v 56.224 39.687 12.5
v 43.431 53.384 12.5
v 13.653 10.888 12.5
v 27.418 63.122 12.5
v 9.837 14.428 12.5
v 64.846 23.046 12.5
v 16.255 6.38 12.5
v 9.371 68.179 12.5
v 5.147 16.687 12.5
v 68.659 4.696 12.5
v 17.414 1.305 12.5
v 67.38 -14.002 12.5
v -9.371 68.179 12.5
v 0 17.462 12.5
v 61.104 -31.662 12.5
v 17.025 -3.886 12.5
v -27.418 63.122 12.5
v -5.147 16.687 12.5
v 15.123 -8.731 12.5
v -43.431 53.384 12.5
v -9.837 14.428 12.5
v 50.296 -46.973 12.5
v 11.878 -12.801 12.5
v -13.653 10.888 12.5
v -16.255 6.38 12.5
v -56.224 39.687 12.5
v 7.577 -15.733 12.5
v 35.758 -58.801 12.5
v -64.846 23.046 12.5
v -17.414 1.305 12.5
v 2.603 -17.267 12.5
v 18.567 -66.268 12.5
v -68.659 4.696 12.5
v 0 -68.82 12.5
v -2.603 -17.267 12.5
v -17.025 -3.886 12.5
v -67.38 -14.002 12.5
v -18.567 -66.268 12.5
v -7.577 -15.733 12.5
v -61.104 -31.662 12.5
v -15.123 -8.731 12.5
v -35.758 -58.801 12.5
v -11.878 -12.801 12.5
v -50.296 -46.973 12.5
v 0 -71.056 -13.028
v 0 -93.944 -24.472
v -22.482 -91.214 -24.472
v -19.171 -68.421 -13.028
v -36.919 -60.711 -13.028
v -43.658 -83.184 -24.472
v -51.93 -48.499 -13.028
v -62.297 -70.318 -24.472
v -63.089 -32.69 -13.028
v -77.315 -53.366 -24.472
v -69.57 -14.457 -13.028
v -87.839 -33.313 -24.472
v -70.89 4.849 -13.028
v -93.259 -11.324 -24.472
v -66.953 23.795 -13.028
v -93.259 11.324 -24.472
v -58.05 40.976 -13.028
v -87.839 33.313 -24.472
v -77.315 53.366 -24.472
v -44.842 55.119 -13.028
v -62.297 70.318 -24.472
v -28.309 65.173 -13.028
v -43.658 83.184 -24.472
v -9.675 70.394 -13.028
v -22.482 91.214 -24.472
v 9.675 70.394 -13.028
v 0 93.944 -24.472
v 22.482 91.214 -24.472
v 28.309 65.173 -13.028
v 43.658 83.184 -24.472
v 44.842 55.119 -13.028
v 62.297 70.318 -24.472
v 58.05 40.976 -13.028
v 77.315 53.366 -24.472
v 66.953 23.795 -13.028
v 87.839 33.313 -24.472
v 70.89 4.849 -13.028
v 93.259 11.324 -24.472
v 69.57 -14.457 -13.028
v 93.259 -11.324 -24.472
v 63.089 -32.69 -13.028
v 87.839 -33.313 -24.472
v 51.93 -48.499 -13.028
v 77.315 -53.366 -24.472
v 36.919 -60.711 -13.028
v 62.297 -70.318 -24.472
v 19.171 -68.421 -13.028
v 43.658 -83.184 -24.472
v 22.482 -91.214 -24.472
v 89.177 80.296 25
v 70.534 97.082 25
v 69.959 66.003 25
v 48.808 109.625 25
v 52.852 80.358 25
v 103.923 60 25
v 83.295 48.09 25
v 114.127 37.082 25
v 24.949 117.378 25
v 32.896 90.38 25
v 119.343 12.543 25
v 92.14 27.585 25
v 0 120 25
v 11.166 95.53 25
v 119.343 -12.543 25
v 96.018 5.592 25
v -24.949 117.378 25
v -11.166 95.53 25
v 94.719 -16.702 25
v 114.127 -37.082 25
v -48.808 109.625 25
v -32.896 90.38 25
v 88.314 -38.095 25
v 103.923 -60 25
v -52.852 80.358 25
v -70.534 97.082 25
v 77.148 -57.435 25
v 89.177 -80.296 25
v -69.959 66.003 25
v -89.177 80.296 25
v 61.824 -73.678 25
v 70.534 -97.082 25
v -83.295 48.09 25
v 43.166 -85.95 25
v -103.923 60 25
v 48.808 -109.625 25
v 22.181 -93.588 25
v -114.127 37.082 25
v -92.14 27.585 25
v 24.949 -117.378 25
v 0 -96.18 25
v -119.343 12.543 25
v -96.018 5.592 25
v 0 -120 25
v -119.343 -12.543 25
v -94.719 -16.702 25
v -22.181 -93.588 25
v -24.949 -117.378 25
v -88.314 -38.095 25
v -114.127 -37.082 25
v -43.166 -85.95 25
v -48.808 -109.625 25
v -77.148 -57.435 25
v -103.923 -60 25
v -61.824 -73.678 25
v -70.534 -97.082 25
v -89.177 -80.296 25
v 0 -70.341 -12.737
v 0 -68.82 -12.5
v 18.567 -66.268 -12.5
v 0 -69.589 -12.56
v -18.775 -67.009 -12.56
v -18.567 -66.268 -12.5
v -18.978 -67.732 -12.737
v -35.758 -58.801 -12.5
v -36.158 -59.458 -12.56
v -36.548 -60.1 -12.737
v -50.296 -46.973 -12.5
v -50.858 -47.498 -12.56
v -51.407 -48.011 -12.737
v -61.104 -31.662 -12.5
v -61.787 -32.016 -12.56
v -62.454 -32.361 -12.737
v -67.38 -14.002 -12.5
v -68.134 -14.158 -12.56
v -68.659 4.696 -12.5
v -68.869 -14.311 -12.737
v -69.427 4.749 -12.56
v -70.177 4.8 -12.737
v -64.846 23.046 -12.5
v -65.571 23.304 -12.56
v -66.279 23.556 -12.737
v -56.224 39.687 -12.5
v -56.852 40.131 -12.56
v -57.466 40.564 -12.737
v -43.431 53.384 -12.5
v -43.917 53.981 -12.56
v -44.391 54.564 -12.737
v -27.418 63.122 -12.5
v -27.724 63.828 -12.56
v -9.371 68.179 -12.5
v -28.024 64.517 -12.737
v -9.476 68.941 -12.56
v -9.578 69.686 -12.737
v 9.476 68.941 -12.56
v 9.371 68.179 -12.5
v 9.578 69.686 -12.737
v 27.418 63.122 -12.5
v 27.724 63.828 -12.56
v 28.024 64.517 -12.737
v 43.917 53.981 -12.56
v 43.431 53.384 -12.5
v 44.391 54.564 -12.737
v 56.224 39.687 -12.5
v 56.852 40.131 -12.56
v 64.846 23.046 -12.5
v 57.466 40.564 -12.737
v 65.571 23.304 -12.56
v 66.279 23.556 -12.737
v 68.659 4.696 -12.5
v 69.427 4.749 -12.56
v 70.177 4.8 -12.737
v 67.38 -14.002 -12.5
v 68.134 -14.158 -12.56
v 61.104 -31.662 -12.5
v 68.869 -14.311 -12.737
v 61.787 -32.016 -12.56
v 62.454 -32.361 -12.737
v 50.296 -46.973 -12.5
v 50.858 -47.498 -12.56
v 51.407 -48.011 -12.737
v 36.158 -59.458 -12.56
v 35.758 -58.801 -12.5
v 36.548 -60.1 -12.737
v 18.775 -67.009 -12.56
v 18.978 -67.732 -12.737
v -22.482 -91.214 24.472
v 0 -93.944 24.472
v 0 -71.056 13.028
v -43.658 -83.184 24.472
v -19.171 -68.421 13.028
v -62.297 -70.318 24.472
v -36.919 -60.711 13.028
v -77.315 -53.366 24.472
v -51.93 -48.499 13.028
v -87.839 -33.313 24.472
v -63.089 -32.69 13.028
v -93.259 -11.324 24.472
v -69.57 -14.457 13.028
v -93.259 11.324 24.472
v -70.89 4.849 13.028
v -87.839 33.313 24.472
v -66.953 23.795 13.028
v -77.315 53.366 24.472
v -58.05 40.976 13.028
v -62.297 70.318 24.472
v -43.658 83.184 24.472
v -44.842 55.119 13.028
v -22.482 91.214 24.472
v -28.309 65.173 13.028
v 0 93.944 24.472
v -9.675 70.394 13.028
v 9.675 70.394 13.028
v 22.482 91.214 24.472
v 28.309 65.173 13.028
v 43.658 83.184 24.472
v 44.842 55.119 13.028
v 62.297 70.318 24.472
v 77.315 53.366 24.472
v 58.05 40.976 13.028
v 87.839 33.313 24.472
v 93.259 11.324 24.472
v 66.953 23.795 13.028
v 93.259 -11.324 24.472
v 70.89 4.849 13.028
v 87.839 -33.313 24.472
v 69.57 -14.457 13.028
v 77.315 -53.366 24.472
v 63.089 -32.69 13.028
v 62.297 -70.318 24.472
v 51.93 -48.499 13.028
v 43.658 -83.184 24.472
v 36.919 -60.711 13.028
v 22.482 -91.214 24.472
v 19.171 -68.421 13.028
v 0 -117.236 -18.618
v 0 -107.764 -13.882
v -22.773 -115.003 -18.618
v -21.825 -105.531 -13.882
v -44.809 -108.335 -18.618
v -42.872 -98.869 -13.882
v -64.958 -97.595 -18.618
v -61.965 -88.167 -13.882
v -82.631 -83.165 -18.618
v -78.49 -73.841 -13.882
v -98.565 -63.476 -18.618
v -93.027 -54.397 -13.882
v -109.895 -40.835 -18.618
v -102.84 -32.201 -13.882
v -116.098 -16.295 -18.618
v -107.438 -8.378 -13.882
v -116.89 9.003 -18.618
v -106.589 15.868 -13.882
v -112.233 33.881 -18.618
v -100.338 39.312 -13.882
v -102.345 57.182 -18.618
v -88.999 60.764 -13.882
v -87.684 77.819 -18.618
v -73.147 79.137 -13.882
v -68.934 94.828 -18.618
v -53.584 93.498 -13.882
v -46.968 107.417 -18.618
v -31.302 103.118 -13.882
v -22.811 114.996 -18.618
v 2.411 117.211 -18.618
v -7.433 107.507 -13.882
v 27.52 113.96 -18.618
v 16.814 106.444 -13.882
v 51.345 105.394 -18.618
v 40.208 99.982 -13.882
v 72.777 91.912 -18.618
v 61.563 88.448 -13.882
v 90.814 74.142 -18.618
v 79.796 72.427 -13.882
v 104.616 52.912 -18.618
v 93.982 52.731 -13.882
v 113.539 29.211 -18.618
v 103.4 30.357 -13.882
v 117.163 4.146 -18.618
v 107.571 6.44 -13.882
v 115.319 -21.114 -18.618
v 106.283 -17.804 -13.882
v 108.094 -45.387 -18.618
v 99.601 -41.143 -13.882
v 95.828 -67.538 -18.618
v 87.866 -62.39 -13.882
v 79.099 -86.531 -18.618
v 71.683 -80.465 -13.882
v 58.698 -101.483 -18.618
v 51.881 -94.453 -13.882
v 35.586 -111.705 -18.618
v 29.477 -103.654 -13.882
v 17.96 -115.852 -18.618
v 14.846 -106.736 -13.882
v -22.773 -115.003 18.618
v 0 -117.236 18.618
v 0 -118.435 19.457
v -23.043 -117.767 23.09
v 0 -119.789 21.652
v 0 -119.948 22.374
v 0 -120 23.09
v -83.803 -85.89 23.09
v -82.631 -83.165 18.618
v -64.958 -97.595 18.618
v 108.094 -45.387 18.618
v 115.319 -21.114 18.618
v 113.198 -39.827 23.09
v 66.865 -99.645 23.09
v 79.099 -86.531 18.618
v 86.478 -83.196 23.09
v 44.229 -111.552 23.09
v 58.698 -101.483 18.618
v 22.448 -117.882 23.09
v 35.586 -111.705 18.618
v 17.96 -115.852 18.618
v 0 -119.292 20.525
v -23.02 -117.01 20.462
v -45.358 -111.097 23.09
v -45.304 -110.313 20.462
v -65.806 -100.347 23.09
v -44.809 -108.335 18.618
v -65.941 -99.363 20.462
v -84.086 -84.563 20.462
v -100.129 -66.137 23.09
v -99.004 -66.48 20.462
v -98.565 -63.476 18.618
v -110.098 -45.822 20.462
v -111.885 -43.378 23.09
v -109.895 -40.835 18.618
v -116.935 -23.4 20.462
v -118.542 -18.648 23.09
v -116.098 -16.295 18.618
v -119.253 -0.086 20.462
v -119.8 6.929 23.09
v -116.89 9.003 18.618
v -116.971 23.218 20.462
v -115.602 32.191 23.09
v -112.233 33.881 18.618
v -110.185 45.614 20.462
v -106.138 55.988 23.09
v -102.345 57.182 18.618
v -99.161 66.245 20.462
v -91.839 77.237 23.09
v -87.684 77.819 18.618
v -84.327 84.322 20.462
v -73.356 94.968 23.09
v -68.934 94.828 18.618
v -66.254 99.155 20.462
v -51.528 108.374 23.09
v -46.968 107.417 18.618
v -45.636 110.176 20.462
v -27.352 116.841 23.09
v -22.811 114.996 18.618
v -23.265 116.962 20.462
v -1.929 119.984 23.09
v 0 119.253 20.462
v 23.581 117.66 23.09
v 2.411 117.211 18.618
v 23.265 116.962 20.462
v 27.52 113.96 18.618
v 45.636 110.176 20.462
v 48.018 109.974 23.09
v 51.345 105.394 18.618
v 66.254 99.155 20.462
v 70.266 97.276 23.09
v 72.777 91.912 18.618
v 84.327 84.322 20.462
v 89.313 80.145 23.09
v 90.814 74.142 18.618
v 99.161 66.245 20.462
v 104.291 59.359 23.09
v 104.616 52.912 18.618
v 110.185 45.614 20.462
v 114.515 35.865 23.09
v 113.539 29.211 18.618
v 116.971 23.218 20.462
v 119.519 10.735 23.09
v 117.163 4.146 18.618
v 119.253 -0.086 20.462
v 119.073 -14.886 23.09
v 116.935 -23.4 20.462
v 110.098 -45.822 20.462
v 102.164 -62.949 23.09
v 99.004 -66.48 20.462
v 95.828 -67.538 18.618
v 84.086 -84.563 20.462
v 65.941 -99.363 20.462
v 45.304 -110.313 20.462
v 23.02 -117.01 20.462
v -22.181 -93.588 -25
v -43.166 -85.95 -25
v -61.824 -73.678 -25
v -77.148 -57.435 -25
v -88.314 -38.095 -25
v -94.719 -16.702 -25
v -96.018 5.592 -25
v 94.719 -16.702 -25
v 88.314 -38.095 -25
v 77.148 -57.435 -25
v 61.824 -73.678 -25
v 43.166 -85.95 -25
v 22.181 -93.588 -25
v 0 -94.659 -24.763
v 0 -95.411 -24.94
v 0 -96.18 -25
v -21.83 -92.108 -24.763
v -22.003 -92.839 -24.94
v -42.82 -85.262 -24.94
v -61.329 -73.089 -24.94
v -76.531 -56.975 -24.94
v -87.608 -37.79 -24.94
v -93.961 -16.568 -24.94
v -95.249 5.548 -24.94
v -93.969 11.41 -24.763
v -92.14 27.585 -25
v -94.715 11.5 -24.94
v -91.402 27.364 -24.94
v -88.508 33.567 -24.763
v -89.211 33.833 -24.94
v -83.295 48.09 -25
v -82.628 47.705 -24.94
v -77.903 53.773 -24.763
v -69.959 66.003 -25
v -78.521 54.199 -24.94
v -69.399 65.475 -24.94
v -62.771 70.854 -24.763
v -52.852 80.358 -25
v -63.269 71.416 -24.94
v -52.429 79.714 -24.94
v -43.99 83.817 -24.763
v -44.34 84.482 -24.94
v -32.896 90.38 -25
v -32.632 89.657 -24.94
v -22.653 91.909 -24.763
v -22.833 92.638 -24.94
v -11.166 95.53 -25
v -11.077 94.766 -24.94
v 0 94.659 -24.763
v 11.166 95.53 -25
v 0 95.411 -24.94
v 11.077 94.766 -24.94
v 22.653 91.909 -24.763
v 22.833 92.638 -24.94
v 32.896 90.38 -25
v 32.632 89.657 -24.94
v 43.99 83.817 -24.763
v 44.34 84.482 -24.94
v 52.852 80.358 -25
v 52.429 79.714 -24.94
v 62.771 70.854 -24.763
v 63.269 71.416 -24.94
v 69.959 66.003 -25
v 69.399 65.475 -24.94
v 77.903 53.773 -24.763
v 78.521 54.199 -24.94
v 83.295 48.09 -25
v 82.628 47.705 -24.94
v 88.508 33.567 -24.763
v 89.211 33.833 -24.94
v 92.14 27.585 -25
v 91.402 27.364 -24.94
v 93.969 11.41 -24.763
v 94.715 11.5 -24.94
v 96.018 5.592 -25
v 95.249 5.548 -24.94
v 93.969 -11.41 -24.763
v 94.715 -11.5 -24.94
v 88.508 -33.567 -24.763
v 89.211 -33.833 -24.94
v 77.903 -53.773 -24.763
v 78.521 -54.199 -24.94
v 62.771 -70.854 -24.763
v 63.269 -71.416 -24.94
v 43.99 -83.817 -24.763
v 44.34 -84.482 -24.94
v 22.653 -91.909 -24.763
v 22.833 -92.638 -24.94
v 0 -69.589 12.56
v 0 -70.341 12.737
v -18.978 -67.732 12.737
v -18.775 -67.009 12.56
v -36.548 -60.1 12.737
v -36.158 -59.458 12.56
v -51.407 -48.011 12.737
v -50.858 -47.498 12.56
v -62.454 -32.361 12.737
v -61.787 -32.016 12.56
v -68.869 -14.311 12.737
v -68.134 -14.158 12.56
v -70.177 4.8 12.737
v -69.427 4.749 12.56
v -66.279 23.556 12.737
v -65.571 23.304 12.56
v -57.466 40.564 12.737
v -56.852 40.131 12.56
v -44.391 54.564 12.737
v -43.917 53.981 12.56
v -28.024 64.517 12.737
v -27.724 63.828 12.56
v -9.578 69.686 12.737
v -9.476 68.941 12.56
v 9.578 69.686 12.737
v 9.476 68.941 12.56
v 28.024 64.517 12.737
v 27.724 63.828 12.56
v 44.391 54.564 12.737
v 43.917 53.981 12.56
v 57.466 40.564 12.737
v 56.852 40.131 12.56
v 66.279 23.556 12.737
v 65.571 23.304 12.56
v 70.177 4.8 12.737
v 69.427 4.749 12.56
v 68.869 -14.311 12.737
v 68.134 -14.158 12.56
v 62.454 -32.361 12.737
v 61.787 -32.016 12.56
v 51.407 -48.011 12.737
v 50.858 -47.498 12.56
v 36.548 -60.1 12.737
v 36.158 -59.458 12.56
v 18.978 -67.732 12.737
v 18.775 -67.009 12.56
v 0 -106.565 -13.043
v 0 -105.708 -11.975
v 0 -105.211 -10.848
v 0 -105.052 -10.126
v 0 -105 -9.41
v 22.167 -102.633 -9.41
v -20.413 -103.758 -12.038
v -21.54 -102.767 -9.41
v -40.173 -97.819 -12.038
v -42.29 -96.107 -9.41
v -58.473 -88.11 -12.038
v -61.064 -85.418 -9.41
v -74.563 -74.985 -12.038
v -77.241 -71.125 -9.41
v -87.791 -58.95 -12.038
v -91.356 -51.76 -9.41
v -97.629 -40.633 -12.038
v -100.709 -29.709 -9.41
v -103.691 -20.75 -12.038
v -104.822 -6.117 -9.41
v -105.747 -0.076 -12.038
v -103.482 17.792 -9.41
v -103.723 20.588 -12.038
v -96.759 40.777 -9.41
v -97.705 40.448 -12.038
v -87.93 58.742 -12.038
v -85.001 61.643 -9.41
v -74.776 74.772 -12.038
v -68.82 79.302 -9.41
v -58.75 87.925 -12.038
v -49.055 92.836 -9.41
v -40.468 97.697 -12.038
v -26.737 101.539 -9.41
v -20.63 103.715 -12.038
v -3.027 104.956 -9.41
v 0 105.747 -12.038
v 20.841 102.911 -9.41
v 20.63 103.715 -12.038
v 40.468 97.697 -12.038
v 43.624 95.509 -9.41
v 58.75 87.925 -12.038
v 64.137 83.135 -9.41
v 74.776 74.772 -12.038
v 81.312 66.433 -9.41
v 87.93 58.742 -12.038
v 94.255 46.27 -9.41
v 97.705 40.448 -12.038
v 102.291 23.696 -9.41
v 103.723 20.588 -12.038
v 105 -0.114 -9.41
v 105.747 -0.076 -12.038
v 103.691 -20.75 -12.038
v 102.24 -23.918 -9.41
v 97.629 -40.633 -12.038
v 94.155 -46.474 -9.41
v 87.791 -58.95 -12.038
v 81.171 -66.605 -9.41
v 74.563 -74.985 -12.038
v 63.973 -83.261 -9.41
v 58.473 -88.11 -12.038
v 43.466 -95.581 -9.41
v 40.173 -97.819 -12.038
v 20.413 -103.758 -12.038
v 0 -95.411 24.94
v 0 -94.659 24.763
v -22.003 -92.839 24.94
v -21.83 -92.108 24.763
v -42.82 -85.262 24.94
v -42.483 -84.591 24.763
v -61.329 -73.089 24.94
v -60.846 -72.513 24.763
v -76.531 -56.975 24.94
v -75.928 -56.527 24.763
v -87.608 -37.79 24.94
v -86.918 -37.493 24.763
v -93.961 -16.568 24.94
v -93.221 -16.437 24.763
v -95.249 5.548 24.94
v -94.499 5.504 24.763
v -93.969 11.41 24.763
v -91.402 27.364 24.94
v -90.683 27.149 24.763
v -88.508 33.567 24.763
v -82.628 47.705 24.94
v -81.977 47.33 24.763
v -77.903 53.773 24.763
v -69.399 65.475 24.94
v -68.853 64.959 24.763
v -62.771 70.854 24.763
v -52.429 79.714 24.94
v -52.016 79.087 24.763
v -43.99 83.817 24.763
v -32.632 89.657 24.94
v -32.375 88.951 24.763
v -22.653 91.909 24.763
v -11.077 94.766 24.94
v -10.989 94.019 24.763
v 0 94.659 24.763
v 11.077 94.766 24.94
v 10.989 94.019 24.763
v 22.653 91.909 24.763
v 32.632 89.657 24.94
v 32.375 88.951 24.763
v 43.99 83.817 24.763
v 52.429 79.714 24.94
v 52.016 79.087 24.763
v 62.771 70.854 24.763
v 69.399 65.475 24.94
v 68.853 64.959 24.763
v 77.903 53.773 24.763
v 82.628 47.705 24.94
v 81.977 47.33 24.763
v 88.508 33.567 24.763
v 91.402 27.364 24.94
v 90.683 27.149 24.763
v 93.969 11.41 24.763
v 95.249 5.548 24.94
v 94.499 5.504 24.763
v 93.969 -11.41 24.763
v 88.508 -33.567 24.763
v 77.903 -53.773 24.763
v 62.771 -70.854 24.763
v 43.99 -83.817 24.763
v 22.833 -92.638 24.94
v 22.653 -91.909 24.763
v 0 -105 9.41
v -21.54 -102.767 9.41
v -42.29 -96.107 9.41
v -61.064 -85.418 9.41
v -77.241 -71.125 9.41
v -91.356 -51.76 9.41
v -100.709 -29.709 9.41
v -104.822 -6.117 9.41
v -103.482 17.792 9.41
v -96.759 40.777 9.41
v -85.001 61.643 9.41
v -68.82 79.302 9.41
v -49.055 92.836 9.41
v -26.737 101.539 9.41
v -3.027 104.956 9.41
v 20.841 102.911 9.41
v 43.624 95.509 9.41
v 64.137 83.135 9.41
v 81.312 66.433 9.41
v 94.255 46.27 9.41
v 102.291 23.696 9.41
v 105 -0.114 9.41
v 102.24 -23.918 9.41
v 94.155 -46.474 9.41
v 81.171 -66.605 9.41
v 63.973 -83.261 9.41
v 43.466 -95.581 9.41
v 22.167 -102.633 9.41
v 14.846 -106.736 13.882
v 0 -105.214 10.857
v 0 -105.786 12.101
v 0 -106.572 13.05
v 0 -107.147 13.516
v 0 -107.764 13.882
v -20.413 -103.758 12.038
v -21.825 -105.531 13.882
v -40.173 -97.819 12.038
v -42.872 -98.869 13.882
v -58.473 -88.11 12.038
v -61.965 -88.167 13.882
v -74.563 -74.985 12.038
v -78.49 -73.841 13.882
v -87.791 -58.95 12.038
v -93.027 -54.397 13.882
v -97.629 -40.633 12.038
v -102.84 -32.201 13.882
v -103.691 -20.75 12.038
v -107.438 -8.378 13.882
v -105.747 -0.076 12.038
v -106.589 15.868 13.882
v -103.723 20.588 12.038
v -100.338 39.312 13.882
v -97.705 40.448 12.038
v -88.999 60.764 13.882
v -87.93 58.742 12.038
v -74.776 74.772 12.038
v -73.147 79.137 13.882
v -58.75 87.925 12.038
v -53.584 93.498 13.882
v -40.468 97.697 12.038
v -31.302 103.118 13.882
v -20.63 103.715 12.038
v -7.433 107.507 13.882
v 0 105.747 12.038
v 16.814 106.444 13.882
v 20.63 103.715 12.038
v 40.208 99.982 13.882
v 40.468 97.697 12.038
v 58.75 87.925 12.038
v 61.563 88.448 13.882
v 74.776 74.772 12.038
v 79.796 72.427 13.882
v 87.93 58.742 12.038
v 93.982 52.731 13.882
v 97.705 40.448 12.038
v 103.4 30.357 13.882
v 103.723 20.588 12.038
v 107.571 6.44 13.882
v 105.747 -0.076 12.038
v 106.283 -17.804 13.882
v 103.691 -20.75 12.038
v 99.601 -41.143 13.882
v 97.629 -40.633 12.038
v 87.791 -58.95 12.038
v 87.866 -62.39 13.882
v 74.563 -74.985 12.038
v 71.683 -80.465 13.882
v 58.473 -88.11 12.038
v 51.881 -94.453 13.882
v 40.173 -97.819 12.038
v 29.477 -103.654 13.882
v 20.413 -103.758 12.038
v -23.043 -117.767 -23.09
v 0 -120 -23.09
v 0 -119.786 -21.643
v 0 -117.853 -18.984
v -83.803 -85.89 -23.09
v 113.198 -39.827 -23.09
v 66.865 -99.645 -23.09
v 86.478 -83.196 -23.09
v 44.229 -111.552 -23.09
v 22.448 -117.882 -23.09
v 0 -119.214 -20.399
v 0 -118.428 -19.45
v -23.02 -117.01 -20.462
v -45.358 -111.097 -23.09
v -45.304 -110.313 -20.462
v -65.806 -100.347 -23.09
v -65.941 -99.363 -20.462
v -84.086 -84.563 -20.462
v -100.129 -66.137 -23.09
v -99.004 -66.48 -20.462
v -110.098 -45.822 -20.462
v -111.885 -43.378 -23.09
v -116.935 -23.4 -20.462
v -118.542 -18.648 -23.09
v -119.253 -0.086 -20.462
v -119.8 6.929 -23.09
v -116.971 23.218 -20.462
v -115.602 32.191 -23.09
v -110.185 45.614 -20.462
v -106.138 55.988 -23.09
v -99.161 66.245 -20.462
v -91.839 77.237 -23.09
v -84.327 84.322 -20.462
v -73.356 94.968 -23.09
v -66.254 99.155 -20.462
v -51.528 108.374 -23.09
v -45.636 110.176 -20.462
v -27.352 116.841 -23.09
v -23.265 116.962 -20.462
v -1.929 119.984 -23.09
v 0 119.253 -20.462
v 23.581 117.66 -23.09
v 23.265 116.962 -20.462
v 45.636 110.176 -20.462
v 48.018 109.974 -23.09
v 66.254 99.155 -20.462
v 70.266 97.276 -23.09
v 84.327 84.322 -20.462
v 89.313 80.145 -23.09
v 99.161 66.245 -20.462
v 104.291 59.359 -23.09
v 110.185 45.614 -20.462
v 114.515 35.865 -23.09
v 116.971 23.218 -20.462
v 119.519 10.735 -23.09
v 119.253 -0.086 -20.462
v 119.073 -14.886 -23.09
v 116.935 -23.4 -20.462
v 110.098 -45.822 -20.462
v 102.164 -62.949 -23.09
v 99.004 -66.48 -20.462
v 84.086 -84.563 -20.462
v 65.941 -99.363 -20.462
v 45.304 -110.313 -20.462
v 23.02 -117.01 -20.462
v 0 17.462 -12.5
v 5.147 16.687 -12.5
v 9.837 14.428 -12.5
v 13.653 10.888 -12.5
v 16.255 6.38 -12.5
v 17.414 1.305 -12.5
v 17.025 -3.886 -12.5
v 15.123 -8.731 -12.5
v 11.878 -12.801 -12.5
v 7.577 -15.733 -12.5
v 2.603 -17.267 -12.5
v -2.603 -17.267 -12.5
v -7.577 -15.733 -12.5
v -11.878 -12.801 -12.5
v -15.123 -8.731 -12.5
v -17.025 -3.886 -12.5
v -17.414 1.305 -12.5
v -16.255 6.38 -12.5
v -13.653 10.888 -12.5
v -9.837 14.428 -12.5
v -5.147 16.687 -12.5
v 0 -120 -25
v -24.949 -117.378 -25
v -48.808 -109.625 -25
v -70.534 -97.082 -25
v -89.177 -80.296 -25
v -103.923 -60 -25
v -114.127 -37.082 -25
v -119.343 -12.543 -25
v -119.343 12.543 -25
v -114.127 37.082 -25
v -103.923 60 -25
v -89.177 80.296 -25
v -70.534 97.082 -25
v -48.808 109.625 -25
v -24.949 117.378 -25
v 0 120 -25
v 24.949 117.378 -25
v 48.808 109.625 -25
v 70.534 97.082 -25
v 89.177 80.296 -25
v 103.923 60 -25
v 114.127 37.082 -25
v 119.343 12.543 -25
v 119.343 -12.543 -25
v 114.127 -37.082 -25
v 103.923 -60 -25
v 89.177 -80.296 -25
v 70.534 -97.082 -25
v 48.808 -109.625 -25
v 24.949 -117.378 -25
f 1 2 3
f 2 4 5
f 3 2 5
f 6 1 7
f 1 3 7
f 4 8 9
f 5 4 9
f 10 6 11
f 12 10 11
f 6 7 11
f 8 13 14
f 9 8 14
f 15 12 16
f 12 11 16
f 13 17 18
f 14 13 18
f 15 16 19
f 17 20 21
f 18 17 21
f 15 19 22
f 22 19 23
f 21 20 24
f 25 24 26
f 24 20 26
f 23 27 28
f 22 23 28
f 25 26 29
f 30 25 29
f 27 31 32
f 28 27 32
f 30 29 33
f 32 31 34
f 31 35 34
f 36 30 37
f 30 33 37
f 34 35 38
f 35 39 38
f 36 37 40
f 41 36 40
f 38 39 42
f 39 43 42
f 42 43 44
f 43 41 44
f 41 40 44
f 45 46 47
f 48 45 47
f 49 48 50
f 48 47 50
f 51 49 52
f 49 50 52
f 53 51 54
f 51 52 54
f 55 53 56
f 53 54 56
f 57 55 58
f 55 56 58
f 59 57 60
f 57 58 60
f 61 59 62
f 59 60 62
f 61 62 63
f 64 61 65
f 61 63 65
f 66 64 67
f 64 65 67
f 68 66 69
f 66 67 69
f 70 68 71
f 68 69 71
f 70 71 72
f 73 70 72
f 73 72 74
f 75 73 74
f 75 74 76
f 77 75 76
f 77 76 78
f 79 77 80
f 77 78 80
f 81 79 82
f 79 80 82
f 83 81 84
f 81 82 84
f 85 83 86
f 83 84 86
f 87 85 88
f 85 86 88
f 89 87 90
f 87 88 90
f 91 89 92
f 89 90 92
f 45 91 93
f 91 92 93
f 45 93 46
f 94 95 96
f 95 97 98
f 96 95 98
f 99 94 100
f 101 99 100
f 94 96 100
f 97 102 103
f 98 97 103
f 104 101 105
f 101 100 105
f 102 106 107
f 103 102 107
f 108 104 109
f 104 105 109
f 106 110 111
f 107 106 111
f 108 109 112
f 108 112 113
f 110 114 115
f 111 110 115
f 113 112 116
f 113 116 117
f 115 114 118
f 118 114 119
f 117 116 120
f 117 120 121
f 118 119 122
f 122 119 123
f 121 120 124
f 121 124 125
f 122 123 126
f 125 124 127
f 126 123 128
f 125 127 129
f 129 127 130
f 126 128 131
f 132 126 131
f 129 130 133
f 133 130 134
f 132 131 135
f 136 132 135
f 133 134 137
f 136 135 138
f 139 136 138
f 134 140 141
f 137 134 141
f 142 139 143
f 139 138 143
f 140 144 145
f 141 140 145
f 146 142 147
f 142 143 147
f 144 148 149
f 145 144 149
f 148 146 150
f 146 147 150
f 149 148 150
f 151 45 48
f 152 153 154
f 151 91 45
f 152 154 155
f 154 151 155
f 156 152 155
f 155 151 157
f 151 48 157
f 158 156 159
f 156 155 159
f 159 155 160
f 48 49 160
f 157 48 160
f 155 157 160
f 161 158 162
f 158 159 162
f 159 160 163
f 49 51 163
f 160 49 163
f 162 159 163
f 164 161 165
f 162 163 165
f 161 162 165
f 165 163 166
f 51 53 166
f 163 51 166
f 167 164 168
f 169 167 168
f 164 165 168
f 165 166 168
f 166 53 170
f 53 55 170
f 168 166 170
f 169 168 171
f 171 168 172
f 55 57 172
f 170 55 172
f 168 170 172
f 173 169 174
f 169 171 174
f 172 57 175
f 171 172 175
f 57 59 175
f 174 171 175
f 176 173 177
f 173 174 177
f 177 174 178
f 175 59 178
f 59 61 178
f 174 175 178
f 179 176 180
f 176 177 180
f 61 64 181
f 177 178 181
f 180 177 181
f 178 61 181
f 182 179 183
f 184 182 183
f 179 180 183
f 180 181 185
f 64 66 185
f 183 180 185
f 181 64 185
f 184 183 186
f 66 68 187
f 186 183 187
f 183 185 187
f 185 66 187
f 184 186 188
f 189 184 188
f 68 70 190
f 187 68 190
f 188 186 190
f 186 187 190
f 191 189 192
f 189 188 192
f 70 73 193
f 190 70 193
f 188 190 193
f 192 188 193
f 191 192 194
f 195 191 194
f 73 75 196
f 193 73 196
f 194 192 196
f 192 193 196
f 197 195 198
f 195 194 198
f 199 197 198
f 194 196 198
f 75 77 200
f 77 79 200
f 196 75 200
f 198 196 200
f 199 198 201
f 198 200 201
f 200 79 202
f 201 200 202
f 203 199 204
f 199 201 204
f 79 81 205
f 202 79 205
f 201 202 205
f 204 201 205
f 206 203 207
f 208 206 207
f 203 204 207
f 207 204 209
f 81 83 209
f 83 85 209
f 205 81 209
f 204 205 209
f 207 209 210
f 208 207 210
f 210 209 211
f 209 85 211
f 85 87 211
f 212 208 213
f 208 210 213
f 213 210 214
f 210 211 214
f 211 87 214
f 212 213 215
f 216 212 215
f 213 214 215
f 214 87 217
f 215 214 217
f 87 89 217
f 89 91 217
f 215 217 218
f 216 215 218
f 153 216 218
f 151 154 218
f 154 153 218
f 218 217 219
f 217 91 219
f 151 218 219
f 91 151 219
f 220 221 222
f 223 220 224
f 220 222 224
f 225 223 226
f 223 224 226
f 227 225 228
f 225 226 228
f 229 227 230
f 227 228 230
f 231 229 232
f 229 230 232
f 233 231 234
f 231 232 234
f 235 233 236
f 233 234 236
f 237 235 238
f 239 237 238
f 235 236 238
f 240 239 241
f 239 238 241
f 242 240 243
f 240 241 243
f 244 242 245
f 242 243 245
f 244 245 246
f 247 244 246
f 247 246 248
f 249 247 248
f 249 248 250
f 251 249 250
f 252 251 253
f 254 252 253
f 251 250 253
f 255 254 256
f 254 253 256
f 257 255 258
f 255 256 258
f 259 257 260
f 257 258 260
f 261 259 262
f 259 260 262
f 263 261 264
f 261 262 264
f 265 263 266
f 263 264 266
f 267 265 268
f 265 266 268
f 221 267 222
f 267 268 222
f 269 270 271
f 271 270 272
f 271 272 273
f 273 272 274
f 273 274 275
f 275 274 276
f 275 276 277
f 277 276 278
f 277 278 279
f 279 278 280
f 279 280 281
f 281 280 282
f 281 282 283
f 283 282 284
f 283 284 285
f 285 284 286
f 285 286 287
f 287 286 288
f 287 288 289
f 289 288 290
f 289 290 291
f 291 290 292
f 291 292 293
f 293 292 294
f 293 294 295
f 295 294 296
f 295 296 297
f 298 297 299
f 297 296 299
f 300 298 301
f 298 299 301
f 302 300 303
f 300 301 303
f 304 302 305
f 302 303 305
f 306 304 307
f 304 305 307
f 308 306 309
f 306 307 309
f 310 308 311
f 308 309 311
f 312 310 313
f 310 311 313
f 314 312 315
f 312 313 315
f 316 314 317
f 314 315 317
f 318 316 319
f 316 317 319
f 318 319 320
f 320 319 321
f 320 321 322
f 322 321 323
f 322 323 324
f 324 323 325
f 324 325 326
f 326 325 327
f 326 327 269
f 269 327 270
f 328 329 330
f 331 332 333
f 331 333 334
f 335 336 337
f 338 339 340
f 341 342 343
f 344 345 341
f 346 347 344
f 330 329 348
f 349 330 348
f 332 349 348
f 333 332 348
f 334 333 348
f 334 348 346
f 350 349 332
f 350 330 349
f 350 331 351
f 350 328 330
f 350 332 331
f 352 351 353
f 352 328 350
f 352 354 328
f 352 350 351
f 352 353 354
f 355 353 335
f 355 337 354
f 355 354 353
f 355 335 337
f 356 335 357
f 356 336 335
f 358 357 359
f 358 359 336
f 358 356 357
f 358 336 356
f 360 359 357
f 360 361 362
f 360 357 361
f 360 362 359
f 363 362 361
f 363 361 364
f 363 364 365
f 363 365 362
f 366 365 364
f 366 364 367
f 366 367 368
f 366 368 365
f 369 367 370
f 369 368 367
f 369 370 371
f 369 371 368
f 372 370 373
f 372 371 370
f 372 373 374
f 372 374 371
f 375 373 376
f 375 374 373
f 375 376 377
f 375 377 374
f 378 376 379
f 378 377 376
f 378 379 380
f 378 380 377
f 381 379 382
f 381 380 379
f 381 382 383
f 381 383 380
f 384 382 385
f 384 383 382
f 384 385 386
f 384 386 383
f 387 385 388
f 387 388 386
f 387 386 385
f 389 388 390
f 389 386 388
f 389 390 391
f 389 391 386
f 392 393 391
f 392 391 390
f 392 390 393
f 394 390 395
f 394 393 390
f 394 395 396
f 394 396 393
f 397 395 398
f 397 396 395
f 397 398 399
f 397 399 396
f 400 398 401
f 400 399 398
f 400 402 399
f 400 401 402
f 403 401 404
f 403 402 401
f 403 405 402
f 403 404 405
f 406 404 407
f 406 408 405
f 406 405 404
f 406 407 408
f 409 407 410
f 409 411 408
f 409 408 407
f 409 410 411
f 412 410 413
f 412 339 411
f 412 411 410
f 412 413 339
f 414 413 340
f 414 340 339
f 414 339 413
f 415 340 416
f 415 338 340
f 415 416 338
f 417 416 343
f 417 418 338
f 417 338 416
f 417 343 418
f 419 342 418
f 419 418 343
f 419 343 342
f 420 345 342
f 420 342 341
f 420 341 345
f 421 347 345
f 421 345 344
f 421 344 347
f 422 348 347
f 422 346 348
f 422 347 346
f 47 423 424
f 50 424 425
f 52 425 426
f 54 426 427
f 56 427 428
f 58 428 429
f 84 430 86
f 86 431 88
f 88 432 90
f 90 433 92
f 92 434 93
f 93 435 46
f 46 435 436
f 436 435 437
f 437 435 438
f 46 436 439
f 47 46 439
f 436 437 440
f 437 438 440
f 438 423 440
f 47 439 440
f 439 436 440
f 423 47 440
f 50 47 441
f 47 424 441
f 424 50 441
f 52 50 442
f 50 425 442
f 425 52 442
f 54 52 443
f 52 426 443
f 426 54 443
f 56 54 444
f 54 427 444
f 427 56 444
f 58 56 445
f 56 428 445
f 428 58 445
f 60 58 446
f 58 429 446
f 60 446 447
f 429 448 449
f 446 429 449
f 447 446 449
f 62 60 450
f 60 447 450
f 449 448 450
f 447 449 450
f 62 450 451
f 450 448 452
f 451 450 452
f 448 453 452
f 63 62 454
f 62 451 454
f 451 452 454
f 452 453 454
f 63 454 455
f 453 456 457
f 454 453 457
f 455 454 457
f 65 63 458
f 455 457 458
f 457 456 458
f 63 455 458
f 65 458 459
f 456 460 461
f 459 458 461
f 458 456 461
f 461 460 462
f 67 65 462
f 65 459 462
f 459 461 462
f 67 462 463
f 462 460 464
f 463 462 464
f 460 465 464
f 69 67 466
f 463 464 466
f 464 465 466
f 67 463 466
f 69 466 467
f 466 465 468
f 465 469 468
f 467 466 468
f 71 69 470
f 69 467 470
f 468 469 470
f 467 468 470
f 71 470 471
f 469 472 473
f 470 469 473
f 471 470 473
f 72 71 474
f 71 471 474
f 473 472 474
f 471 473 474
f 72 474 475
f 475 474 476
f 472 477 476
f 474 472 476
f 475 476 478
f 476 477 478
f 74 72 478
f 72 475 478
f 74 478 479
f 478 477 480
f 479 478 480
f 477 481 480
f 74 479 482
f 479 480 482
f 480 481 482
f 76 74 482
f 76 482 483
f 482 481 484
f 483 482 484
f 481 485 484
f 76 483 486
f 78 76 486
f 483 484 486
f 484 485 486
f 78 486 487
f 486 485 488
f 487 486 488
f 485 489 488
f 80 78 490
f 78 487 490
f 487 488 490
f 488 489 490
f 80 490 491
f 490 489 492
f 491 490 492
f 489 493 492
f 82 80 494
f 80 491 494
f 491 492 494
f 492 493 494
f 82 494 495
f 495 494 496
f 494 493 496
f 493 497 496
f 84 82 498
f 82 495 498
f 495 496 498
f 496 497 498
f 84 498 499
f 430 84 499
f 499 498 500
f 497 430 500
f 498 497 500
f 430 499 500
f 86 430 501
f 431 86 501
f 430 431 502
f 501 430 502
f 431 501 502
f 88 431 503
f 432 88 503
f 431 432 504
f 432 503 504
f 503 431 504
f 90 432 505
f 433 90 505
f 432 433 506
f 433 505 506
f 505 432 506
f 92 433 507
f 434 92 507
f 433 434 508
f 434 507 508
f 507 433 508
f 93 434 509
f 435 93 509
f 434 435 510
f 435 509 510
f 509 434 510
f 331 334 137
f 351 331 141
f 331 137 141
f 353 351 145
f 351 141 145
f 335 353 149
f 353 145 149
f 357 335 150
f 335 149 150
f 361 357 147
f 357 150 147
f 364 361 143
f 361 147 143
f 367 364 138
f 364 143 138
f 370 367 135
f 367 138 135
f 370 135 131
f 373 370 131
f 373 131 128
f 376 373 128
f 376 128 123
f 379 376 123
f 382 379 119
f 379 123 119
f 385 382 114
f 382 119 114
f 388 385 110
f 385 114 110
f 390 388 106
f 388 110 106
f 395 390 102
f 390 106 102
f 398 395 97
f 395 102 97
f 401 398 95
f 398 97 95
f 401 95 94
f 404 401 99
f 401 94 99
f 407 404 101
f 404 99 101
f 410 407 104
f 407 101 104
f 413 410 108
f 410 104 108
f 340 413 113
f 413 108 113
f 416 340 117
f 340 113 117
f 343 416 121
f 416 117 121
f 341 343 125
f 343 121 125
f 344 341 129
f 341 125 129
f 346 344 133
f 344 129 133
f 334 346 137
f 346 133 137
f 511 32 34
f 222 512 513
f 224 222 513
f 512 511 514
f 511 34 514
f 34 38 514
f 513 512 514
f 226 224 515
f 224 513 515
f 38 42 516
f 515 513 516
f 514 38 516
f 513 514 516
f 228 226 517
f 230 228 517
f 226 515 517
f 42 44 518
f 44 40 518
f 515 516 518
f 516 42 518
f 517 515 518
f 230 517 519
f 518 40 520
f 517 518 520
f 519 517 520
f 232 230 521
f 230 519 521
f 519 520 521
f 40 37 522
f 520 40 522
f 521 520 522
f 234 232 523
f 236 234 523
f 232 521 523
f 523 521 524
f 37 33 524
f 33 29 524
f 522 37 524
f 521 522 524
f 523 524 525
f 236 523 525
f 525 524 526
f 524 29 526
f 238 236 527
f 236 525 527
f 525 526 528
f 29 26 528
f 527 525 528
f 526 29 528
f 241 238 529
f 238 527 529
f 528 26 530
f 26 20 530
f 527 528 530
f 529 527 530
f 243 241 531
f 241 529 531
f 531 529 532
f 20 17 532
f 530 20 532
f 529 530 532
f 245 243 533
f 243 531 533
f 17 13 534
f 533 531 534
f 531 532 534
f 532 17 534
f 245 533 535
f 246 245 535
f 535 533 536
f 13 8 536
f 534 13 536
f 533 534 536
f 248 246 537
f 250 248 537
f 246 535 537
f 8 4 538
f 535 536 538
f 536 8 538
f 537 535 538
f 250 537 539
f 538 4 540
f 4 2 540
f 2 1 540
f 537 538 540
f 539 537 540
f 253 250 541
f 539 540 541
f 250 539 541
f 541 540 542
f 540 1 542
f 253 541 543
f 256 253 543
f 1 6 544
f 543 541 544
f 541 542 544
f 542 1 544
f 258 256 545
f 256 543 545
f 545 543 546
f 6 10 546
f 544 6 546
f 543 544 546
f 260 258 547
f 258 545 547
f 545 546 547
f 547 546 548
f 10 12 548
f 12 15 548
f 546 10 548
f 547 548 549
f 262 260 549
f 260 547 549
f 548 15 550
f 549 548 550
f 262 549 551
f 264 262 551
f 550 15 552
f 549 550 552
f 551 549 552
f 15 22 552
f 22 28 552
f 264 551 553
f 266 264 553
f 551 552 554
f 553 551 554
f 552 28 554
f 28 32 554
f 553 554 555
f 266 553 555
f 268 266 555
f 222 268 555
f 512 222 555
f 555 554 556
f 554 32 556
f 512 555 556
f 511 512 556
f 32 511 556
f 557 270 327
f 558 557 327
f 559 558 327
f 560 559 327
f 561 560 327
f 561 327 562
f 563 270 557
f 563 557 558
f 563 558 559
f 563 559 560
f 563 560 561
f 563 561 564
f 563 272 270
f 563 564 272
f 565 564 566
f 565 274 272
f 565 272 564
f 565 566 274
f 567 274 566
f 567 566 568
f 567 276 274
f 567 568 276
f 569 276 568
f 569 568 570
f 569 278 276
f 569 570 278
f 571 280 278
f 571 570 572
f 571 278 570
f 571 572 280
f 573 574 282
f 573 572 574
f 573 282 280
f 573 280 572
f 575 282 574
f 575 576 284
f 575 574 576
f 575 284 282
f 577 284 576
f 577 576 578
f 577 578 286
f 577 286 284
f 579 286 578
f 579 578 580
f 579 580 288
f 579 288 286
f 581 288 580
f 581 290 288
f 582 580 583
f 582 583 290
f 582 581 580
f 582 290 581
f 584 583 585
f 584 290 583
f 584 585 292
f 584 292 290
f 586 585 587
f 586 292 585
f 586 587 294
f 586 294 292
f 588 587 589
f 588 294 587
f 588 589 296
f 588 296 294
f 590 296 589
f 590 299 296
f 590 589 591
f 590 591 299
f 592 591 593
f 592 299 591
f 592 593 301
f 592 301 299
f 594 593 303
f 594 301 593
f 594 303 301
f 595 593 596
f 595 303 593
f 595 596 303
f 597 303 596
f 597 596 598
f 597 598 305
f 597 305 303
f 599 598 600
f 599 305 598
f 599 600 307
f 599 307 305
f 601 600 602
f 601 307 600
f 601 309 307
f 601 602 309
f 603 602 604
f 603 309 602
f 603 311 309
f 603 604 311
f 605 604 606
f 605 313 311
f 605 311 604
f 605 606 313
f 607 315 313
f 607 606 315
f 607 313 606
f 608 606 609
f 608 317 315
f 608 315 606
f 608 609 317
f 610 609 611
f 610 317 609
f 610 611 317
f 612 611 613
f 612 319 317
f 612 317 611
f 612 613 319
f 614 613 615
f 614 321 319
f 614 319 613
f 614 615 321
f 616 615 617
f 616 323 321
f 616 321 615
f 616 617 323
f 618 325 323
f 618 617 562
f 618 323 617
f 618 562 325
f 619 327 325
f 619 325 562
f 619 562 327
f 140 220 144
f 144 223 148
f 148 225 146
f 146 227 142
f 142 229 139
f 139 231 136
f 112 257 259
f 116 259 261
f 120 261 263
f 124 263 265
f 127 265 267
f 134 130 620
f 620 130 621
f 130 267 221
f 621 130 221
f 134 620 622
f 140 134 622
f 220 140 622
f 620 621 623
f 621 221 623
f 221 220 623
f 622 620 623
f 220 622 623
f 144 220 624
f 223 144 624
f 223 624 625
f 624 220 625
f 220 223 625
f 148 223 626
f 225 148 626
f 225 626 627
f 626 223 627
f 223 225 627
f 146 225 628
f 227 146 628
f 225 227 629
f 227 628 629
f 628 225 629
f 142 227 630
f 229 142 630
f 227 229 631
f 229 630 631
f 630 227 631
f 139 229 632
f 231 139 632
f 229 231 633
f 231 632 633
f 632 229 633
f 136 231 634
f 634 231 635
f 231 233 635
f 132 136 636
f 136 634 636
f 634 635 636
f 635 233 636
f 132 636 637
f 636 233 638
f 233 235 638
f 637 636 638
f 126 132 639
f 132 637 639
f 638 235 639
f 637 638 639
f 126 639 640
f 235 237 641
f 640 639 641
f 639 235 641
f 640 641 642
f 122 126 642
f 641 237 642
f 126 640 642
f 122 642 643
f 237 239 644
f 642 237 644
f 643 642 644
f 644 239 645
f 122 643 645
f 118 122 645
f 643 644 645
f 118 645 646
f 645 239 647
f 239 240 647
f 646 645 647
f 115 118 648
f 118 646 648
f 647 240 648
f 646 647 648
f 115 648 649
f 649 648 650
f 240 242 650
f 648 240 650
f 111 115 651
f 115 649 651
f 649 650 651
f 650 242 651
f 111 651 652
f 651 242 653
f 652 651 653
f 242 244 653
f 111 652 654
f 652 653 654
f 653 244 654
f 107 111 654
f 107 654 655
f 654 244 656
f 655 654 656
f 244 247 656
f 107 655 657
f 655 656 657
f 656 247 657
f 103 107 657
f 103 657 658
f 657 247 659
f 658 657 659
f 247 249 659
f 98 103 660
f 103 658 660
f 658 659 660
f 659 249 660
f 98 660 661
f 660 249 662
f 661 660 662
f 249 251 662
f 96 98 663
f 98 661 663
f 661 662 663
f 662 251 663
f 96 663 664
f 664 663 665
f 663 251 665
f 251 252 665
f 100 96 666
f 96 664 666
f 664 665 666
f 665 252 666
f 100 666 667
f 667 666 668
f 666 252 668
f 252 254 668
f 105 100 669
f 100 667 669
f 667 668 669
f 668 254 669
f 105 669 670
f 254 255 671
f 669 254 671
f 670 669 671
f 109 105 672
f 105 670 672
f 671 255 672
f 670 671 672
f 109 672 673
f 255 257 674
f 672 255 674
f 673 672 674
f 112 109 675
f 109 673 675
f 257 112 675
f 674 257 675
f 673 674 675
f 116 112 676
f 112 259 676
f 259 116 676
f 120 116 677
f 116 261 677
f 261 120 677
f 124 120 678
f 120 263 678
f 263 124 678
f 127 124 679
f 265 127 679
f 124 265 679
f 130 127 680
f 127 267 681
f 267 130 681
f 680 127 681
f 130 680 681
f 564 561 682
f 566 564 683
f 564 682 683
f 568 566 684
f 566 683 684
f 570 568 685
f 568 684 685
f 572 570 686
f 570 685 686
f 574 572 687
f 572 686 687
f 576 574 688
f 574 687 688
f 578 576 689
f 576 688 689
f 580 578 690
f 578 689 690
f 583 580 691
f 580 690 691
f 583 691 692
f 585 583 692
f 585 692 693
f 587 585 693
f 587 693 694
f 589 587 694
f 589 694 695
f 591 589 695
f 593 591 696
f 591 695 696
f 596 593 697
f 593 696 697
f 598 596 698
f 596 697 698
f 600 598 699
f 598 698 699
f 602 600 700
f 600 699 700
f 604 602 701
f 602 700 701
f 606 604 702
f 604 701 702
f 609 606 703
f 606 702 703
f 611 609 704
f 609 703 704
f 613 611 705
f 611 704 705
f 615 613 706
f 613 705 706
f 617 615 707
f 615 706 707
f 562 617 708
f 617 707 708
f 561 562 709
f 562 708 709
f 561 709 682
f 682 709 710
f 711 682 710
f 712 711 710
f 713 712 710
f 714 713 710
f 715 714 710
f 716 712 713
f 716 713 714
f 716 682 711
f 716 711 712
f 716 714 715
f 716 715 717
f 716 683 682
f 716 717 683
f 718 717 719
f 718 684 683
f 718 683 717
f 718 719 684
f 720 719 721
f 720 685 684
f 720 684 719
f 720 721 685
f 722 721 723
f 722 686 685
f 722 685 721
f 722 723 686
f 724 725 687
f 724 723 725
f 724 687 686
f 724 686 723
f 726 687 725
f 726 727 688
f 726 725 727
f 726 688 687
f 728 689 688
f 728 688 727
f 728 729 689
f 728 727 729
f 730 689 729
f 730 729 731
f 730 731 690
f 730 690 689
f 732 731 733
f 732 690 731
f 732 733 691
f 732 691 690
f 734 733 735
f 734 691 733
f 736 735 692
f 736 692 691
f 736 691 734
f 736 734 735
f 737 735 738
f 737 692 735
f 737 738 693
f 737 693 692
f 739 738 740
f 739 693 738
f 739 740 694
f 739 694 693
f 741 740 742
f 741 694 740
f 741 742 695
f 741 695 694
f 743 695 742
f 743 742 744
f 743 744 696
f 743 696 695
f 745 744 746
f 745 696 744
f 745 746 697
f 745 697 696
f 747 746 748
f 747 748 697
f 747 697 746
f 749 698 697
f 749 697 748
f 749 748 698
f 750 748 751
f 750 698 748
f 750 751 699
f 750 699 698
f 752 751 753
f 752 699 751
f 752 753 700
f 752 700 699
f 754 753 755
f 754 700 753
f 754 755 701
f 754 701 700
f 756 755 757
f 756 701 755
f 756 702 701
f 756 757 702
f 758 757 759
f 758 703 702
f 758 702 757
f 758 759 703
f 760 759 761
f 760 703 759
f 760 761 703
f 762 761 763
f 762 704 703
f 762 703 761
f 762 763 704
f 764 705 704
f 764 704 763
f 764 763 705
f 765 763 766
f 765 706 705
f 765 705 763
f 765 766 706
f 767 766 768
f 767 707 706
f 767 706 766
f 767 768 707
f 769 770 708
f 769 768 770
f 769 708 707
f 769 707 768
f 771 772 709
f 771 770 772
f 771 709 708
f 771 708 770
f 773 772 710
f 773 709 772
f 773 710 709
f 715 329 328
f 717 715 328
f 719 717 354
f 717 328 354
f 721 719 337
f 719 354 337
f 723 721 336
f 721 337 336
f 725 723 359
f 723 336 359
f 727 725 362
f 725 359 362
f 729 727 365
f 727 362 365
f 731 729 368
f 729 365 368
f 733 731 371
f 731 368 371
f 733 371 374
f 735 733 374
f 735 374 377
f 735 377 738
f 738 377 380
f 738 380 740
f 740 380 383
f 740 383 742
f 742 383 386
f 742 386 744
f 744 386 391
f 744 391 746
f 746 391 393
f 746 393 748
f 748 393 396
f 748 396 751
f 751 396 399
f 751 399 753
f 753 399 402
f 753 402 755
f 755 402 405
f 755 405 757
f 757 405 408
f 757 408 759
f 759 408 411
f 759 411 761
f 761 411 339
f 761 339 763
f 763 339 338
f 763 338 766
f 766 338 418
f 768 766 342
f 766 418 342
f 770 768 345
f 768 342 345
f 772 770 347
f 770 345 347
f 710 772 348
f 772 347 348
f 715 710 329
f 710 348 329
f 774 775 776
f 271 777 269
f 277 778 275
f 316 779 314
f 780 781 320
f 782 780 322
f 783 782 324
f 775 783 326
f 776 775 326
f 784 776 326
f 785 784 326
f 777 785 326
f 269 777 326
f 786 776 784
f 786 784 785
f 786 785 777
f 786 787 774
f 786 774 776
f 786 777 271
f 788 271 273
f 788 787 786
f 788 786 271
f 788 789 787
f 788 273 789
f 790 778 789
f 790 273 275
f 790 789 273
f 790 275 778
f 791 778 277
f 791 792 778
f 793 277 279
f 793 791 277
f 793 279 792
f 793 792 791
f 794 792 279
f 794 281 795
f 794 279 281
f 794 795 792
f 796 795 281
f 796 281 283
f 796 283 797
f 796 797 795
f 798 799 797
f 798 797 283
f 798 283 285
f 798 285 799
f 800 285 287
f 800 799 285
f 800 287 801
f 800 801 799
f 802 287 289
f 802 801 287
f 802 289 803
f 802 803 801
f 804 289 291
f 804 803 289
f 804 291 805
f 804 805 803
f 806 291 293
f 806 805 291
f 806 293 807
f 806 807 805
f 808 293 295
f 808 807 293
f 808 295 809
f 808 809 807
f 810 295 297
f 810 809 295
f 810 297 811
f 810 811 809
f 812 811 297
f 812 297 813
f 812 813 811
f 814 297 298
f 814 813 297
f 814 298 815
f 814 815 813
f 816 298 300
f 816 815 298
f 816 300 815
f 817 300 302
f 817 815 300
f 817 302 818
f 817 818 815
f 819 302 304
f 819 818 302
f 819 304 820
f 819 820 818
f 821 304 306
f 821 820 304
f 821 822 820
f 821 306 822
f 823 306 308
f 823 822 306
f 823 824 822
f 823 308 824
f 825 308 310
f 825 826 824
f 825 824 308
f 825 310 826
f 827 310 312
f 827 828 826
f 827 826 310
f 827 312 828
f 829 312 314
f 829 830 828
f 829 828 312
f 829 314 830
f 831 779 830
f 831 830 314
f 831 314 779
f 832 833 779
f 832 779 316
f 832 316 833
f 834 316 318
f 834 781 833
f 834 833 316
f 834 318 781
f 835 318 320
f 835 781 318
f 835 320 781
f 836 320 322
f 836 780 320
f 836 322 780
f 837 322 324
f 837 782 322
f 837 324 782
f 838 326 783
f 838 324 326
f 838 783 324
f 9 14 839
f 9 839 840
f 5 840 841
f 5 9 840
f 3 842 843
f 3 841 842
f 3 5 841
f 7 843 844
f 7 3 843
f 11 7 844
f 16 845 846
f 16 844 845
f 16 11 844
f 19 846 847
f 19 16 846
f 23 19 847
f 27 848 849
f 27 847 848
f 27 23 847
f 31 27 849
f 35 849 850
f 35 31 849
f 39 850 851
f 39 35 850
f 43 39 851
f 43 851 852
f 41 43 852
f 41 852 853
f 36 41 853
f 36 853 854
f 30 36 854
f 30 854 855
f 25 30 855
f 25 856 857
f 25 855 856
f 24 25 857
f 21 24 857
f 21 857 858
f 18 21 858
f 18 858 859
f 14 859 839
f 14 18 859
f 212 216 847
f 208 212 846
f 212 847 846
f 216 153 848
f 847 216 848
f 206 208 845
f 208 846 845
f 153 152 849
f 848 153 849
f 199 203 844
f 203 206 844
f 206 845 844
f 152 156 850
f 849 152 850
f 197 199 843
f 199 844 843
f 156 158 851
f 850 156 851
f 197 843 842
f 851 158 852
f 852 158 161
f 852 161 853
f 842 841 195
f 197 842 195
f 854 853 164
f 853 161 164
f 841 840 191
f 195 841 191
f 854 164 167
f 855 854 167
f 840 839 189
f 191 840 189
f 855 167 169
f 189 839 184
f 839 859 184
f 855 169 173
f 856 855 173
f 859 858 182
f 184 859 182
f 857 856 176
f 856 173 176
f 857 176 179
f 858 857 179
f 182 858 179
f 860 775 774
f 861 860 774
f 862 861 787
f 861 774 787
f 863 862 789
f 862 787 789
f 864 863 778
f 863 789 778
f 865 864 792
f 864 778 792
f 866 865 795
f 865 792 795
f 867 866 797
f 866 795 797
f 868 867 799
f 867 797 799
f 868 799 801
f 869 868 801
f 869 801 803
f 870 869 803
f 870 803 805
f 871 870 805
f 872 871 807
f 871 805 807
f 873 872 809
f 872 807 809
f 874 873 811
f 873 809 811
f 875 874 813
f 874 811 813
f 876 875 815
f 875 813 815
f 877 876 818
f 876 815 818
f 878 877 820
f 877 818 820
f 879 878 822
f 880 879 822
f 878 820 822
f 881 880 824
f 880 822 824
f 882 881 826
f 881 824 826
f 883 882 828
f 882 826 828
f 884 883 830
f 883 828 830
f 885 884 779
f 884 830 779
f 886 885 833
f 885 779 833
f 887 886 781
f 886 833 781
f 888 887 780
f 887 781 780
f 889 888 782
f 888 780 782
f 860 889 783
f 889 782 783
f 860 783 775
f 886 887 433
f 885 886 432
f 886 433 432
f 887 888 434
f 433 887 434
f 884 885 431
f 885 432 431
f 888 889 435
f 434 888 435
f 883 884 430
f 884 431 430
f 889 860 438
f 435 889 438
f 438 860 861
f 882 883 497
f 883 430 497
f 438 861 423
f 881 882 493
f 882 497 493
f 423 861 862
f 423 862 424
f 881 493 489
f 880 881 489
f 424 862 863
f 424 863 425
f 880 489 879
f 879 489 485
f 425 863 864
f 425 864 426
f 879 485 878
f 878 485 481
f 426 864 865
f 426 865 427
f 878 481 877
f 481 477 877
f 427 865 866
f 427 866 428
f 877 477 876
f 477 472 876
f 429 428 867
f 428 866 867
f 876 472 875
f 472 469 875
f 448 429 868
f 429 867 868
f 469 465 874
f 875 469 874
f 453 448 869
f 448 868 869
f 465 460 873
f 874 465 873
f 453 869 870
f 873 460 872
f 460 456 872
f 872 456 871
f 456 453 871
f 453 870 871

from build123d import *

# Parameters (mm, degrees)
FILLETS_R            = 5
SHAFT_CUT_DEPTH      = 174.799455871
SHAFT_CUT_DEPTH_BACK = 174.799455871
SKETCH3_R            = 17.4625


with BuildPart() as part:
    # Sketch1 → Main wheel extrude (revolve)
    with BuildSketch(Plane(origin=(0, 0, 0), x_dir=(0, 0, -1), z_dir=(1, 0, 0)), mode=Mode.PRIVATE) as main_wheel_extrude_sk:
        Polygon((-25, 120), (-25, 95), (-12.5, 70), (-12.5, 0), (12.5, 0), (12.5, 70), (25, 95), (25, 120), (20, 120), (12.5, 105), (-12.5, 105), (-20, 120), align=None)
    revolve(main_wheel_extrude_sk.sketch.rotate(Axis((0, 0, 12.5), (0, 0, -1)), 180), axis=Axis((0, 0, 12.5), (0, 0, -1)))

    # Fillets
    fillets_edges = [part.edges().sort_by_distance(p)[0] for p in [
        (0, 105, -12.5),
        (0, 120, -20),
        (0, 95, -25),
        (0, 70, -12.5),
        (0, 70, 12.5),
        (0, 95, 25),
        (0, 120, 20),
        (0, 105, 12.5),
    ]]
    fillet(fillets_edges, radius=FILLETS_R)

    # Sketch3 → Shaft cut (cut, two sides: drawn at the far end of the back side and taken through both)
    with BuildSketch(Plane(origin=(0, 0, -12.5), x_dir=(-1, 0, 0), z_dir=(0, 0, -1)).offset(-SHAFT_CUT_DEPTH_BACK)):
        with Locations(Location((0, 0, 0), (0, 0, 90))):
            Circle(SKETCH3_R)
    extrude(amount=SHAFT_CUT_DEPTH + SHAFT_CUT_DEPTH_BACK, mode=Mode.SUBTRACT)


solid = part.part
